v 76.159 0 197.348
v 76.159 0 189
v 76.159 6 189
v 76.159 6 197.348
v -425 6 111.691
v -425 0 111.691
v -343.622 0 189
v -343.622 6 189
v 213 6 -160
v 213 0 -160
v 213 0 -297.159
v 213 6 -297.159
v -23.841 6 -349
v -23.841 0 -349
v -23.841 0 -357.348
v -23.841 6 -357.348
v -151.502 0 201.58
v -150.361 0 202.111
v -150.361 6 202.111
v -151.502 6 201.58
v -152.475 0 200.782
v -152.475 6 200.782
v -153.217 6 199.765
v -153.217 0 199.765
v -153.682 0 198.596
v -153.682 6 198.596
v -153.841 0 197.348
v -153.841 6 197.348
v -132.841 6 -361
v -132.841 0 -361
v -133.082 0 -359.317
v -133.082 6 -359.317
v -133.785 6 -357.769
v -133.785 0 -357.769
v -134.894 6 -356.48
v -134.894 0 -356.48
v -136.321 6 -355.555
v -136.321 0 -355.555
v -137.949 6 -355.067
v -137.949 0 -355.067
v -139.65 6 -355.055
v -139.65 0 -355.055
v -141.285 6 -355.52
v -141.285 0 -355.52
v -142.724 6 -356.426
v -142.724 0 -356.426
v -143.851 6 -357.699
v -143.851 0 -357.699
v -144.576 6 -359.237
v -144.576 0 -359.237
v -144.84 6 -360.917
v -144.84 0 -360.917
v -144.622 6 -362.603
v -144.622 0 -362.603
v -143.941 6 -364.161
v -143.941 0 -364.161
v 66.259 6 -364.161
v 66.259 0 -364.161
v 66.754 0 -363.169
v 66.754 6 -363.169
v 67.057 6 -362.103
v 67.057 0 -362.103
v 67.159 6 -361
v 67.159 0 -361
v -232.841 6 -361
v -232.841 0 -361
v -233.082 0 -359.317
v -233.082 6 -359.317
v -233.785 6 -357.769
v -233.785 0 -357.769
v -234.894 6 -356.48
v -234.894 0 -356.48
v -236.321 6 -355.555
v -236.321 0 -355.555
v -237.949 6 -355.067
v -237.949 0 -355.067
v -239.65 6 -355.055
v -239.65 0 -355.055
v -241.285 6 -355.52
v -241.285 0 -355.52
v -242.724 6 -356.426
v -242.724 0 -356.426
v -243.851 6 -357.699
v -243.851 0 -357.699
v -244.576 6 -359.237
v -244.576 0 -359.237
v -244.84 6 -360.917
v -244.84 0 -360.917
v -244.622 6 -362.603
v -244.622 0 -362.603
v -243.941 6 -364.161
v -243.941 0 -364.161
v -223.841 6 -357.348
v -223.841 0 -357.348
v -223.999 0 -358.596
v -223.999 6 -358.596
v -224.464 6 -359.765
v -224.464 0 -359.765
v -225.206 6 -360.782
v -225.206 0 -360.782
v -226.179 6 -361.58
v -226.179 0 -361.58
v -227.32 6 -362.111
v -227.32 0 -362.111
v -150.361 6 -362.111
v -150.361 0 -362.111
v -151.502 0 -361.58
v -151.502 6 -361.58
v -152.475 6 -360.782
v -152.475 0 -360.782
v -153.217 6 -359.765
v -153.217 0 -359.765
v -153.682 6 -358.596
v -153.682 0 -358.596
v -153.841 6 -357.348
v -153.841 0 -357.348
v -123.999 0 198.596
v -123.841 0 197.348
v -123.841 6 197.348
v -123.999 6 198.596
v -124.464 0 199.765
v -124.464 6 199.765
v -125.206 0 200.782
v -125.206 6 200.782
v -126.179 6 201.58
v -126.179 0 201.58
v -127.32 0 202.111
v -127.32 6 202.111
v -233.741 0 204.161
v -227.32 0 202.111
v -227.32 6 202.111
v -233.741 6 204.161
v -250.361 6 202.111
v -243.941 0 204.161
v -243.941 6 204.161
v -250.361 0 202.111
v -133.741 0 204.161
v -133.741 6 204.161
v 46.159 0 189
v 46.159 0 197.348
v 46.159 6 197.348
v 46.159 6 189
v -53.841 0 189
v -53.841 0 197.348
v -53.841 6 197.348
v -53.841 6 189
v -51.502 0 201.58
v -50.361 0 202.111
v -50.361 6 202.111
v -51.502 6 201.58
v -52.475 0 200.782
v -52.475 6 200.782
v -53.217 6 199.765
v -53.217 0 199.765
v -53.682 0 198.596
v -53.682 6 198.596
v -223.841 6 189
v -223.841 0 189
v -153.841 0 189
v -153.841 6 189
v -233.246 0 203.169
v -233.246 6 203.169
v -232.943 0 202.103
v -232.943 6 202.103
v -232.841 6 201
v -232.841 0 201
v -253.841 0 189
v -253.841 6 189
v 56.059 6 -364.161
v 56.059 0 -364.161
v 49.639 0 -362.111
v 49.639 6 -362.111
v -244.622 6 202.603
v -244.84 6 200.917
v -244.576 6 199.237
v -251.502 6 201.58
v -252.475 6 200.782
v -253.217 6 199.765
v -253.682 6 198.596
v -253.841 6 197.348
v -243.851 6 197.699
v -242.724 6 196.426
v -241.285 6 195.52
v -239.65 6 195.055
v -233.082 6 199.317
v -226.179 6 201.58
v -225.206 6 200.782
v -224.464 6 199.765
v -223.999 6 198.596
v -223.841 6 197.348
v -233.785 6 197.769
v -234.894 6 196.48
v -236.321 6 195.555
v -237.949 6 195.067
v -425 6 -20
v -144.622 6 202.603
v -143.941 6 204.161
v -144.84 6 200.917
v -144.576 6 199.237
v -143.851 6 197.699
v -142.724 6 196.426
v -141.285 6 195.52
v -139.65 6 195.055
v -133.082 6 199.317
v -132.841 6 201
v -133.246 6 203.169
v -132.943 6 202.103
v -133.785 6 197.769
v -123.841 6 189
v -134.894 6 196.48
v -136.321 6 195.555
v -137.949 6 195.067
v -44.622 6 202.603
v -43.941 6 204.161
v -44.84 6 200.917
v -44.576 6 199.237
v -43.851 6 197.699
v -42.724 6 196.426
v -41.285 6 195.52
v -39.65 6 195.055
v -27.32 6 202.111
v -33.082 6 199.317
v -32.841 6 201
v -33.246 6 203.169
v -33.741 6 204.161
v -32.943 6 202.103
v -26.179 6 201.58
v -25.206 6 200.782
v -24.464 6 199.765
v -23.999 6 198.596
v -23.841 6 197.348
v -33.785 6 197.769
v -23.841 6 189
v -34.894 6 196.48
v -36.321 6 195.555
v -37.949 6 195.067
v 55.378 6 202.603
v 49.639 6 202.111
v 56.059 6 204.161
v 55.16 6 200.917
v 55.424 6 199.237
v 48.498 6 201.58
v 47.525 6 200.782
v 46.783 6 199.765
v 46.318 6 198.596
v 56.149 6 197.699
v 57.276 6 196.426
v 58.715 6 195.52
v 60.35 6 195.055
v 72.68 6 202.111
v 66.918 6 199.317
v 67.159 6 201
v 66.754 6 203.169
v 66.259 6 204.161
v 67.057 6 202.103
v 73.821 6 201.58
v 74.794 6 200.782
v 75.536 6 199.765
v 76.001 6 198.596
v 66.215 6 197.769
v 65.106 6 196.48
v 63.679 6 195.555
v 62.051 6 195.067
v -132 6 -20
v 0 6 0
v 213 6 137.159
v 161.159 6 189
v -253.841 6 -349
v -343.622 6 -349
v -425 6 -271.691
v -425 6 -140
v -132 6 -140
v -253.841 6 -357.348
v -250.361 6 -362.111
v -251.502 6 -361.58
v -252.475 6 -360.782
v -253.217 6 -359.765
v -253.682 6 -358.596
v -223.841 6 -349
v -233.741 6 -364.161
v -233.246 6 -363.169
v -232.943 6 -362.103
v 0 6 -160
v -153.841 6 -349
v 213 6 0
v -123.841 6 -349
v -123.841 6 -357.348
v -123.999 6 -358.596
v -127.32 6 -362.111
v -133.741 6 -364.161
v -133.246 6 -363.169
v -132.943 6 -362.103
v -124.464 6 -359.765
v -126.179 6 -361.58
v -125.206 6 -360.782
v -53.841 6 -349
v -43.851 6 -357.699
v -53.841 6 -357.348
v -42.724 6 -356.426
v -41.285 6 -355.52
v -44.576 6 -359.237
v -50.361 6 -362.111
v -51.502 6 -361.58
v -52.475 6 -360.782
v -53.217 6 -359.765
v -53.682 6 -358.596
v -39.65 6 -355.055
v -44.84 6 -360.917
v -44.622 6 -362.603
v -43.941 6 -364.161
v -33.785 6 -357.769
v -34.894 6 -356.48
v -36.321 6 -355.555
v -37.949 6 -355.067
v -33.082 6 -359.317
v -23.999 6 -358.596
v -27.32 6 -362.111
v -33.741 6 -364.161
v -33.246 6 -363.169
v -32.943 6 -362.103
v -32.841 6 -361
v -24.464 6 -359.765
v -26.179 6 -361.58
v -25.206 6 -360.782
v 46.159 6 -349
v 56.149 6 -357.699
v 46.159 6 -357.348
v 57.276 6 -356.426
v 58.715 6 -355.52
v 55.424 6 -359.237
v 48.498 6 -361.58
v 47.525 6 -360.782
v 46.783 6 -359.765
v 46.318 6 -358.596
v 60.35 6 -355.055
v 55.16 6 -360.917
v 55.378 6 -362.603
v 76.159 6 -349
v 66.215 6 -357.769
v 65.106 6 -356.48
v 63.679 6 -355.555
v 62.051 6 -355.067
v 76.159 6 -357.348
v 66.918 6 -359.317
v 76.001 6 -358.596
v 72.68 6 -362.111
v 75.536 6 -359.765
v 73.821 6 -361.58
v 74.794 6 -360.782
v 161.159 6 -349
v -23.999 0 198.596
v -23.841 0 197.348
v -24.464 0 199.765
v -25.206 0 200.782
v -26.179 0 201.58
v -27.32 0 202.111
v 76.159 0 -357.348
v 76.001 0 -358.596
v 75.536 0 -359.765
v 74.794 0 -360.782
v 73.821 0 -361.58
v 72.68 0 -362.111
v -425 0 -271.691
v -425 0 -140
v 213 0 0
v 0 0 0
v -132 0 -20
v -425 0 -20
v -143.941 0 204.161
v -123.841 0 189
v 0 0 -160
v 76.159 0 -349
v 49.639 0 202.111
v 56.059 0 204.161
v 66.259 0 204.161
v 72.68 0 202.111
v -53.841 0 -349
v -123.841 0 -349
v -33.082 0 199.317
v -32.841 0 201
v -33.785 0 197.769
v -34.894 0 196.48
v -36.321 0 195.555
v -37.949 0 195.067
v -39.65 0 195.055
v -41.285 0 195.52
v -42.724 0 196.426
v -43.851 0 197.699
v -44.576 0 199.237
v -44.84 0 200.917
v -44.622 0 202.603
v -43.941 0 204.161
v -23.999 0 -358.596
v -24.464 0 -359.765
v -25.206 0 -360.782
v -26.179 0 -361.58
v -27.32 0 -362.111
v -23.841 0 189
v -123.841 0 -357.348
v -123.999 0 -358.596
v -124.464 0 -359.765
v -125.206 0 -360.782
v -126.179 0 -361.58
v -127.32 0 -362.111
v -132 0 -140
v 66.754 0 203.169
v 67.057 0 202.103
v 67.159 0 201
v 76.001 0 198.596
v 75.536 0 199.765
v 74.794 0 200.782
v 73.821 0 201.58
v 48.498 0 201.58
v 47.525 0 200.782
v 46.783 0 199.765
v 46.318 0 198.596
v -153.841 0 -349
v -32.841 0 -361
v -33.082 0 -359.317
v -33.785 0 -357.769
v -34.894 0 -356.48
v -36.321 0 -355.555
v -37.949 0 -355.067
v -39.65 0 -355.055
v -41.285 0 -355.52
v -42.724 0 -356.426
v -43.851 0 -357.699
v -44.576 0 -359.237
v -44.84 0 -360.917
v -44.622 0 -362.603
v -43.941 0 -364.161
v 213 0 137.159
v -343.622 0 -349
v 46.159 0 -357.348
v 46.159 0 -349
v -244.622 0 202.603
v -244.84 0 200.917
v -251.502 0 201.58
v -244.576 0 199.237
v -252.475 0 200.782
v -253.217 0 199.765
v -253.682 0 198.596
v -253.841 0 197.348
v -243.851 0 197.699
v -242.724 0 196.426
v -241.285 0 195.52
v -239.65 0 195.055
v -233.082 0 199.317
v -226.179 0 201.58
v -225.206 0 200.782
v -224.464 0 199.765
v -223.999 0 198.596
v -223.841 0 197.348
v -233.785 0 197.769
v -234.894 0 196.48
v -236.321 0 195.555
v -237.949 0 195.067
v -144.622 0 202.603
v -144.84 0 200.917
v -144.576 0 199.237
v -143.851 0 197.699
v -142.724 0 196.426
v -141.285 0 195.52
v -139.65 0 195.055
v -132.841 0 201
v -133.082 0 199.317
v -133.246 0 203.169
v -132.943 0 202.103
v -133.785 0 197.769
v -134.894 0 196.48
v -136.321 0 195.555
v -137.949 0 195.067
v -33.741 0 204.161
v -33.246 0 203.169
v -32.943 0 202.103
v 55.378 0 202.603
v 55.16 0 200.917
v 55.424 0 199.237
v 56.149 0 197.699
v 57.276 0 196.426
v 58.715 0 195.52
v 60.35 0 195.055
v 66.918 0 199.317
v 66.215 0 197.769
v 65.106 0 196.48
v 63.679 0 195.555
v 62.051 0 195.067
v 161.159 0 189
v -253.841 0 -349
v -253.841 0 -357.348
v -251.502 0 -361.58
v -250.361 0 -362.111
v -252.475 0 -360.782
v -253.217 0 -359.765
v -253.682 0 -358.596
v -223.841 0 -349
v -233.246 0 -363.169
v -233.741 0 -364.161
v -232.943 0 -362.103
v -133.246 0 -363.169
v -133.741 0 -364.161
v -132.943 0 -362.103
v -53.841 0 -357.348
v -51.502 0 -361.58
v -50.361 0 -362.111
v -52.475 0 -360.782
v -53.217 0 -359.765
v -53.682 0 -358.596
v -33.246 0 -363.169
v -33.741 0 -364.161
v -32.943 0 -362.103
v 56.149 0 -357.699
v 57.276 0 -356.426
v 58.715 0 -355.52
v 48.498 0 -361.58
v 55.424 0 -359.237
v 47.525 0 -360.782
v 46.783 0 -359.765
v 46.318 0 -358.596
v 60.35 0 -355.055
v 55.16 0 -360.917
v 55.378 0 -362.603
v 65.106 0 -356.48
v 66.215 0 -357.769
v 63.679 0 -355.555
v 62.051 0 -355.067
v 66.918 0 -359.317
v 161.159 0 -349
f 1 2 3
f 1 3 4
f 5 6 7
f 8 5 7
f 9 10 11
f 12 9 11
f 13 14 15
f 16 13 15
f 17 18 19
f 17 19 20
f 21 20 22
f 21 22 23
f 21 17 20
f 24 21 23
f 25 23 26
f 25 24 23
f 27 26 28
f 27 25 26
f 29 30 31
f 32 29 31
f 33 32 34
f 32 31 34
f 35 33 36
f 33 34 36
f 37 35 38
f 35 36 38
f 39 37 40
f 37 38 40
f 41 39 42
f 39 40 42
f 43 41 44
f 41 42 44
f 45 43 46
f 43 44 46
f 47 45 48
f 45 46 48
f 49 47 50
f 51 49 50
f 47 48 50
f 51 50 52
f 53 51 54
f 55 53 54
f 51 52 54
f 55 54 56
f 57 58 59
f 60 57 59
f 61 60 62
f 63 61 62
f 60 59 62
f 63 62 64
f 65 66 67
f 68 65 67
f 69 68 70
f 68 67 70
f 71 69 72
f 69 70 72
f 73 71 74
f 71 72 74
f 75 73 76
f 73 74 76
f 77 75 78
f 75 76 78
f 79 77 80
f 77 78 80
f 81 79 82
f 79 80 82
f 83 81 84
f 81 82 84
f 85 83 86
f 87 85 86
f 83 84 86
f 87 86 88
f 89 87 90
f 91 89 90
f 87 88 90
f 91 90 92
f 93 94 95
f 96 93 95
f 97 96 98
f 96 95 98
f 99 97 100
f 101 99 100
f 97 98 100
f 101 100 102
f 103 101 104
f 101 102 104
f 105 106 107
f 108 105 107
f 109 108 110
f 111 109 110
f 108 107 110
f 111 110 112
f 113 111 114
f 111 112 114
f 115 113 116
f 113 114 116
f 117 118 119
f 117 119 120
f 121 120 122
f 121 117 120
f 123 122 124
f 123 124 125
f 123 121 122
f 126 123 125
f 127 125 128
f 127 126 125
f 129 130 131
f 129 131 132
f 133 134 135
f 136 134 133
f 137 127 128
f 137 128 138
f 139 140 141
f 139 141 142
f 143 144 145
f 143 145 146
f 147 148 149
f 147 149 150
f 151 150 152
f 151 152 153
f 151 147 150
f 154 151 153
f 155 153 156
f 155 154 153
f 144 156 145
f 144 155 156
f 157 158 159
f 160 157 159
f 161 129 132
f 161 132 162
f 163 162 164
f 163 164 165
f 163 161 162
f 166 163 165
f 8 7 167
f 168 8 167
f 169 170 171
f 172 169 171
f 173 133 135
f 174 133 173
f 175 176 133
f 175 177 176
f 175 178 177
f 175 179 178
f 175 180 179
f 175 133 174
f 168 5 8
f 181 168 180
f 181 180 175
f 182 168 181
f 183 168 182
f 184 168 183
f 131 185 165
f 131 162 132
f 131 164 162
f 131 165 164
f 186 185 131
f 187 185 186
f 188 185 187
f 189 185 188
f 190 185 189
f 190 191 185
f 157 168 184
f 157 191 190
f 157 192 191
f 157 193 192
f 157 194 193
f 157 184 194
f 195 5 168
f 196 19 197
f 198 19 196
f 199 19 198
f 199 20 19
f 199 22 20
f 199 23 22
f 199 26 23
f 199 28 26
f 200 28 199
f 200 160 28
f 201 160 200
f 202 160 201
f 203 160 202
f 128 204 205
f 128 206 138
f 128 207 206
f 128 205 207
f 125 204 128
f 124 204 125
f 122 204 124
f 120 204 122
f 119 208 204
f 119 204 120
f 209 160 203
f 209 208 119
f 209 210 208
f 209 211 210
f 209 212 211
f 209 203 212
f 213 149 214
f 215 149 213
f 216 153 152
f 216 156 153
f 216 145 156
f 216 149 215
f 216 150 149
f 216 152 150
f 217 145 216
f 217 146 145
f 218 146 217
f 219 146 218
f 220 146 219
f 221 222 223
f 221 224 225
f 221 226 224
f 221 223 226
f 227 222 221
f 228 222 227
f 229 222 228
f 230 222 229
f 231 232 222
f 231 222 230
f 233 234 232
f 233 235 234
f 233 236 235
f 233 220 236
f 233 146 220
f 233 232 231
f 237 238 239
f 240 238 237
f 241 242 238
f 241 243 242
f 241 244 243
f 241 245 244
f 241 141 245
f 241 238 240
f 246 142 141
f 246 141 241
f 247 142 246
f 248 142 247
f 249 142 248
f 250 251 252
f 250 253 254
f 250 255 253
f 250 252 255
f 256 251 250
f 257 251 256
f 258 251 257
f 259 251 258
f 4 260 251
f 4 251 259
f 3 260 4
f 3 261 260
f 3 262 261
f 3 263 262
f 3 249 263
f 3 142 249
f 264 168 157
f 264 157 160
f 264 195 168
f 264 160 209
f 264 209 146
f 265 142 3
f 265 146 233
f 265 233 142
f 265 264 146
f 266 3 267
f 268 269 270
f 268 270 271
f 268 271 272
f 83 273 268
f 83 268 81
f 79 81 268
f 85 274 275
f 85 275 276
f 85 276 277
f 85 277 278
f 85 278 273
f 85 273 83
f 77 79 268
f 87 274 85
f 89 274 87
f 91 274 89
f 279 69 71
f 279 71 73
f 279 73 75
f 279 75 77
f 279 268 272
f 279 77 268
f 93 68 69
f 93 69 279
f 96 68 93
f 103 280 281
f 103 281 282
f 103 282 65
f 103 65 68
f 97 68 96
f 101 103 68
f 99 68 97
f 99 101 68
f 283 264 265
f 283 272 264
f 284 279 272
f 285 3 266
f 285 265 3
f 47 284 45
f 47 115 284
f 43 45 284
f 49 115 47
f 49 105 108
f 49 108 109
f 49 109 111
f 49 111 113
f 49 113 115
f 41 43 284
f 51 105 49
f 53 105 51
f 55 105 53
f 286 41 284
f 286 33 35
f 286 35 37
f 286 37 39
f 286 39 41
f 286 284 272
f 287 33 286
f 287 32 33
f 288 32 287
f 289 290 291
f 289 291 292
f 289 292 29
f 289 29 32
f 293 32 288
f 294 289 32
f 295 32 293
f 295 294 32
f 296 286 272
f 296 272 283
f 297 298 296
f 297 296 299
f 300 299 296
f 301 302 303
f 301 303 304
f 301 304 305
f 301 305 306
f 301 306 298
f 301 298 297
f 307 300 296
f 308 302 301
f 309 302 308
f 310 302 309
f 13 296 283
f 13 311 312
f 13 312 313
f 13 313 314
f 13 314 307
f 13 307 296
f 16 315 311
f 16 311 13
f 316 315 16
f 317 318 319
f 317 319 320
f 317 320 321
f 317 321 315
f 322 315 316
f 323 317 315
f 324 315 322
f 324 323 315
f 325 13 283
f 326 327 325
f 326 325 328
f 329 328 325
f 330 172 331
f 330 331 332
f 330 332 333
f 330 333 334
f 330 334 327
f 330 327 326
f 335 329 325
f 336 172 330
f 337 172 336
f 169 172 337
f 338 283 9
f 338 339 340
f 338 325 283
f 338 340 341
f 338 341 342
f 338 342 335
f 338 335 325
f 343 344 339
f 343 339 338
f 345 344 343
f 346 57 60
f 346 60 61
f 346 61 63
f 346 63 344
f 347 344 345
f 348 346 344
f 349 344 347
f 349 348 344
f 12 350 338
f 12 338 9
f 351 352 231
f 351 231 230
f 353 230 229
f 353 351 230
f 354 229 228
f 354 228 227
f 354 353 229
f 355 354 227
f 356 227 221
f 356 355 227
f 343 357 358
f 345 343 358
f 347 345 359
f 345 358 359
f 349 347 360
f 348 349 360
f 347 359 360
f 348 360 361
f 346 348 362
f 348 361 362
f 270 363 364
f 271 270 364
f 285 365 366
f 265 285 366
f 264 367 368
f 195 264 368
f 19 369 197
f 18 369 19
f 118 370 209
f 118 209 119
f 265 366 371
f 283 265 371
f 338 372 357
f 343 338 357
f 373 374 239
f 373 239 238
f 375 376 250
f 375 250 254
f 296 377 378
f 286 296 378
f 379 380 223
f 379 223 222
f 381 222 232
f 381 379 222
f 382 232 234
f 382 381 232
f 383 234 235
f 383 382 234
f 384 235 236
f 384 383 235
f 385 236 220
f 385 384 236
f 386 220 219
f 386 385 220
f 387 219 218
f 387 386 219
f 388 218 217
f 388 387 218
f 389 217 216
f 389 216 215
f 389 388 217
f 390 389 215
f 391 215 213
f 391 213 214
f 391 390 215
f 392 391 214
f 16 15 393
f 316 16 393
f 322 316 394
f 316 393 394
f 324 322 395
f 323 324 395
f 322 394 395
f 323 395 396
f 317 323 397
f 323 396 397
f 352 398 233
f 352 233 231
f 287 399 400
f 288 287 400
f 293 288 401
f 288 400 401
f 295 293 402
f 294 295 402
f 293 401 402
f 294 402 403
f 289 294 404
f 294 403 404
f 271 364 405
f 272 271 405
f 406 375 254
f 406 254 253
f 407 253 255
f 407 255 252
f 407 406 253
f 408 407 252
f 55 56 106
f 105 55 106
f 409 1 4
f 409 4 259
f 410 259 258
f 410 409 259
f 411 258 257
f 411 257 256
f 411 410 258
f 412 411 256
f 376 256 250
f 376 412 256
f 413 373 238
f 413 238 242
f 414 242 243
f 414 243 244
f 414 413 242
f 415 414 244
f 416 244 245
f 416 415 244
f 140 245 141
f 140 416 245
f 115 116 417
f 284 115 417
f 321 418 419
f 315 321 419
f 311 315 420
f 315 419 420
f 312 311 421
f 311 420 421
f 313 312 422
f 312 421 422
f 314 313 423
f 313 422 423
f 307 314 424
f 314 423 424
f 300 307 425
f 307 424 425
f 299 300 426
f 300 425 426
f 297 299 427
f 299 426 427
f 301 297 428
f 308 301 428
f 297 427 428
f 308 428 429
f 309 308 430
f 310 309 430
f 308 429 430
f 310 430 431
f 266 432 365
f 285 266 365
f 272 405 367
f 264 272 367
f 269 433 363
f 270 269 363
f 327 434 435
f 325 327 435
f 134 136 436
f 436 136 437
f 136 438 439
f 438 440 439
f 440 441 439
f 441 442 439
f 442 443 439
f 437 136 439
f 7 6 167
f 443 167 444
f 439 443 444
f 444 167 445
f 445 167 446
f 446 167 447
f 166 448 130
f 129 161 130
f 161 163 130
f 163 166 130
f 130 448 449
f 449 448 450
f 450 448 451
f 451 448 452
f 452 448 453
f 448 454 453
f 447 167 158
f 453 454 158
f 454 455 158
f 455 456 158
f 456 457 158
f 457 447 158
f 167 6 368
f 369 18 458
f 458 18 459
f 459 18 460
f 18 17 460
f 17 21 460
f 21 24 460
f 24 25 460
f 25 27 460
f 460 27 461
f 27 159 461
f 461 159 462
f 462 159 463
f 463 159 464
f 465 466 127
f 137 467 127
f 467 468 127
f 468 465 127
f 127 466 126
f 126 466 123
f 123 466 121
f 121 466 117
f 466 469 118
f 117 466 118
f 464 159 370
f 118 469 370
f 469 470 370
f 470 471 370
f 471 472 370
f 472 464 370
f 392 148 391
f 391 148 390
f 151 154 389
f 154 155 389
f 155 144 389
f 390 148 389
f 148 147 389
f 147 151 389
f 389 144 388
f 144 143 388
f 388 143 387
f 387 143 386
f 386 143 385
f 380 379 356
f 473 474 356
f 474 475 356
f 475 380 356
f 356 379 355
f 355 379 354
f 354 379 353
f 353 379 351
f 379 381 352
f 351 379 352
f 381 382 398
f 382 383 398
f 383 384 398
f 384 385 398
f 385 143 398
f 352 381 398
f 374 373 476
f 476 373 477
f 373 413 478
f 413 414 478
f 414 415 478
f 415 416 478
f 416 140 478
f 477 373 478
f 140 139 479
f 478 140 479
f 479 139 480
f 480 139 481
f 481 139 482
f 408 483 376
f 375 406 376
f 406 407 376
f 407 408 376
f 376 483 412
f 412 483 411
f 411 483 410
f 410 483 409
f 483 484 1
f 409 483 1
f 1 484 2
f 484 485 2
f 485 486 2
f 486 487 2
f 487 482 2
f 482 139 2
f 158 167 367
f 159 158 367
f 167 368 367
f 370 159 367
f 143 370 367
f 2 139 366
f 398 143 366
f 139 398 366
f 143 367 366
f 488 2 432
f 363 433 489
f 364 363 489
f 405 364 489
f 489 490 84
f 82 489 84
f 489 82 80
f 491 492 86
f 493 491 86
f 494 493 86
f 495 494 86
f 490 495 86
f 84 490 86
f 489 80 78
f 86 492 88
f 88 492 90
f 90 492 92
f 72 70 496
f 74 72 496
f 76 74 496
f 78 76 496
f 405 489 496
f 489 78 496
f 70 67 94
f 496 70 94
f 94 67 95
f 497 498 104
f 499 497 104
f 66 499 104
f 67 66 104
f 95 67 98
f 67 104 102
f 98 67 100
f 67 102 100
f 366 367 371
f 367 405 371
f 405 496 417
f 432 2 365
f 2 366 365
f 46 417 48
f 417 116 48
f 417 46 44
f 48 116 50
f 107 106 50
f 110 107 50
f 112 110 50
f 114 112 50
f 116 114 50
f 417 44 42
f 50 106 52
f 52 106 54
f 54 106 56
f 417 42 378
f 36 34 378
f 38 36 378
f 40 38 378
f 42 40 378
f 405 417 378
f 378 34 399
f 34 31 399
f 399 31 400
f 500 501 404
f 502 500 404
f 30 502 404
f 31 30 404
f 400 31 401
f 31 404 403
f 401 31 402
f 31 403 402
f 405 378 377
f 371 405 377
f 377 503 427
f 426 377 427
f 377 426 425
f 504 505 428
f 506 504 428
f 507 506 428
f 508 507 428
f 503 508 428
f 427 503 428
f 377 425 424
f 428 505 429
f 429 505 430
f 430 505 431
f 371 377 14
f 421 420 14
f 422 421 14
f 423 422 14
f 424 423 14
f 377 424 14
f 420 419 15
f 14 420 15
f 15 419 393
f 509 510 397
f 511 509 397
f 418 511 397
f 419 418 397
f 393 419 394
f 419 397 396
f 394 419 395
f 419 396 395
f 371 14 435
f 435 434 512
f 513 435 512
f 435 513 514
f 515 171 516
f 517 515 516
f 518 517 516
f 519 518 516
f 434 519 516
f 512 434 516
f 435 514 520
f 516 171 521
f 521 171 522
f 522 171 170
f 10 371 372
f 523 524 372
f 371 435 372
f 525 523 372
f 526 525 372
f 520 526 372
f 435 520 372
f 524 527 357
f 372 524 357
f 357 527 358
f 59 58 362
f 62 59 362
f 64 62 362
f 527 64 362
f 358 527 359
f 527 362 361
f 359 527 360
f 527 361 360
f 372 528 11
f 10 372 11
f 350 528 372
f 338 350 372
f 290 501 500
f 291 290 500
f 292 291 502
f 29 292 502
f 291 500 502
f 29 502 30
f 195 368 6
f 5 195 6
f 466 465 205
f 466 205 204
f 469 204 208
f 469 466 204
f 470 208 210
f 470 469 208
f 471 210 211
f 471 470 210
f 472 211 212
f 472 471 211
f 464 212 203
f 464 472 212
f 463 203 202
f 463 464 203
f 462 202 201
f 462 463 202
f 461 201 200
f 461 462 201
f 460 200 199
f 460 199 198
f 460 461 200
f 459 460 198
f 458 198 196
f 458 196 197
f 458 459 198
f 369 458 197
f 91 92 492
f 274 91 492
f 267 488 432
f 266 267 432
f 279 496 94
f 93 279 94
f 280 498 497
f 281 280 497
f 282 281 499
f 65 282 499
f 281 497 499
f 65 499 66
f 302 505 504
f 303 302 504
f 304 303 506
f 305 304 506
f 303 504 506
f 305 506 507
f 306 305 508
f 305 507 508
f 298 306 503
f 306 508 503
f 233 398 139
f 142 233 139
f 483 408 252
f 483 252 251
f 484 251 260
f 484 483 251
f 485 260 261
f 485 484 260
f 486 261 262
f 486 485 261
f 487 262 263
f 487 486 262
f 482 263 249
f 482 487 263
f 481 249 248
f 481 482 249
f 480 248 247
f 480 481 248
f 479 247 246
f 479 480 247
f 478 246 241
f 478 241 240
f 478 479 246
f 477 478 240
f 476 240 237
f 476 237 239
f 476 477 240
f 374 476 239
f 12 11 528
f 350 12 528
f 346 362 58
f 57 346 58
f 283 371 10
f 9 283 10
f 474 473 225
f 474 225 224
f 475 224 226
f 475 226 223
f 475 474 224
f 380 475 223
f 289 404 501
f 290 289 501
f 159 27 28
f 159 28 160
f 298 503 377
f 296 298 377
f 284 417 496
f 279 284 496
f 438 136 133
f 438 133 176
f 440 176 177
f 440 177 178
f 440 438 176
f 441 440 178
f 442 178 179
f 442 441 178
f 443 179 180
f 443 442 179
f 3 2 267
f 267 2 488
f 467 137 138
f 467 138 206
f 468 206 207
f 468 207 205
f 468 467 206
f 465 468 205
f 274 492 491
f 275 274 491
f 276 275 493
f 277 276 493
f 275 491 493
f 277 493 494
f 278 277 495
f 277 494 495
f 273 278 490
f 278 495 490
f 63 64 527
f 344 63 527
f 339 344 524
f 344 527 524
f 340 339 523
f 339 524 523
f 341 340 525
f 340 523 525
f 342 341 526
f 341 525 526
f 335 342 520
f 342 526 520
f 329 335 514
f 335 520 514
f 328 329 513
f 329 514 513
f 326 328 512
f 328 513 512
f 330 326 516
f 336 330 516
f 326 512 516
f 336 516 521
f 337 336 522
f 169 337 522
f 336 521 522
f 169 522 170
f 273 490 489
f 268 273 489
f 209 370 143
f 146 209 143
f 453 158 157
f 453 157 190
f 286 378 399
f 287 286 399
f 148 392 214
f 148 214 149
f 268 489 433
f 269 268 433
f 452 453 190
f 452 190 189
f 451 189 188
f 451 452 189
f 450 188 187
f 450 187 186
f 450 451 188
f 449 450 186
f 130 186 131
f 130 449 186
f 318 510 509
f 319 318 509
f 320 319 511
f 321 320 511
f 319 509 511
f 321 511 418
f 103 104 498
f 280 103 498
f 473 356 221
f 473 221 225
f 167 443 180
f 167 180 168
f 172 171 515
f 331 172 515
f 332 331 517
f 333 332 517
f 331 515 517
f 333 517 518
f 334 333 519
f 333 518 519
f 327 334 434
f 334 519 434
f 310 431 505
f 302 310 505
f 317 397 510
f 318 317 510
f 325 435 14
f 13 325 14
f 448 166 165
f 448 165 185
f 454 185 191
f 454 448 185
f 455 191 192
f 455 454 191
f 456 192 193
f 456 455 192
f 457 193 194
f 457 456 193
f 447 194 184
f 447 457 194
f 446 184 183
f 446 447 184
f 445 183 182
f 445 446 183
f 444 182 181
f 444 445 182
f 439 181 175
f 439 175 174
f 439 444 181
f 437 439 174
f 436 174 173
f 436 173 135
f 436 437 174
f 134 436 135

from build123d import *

# Parameters (mm, degrees)
BOSS_EXTRUDE1_DEPTH  = 6
BOSS_EXTRUDE2_DEPTH  = 6
LPATTERN1_COUNT      = 4
LPATTERN1_PITCH      = 100
MIRROR1_COPY_1_DEPTH = 6
MIRROR1_COPY_2_DEPTH = 6
MIRROR1_COPY_3_DEPTH = 6


with BuildPart() as part:
    # Sketch1 → Boss-Extrude1 (new body)
    with BuildSketch(Plane(origin=(0, 0, 0), x_dir=(1, 0, 0), z_dir=(0, 1, 0))):
        Polygon((0, 160), (213, 160), (213, 297.159379566), (161.159379566, 349), (76.159379566, 349), (46.159379566, 349), (-343.622469374, 349), (-425, 271.691345905), (-425, 140), (-132, 140), (-132, 20), (-425, 20), (-425, -111.691345905), (-343.622469374, -189), (161.159379566, -189), (213, -137.159379566), (213, 0), (0, 0), align=None)
    extrude(amount=BOSS_EXTRUDE1_DEPTH)

    # Sketch1<3> → Boss-Extrude2 (add)
    with BuildSketch(Plane(origin=(0, 0, 0), x_dir=(1, 0, 0), z_dir=(0, 1, 0))):
        with BuildLine():
            Line((46.159379566, 349), (76.159379566, 349))
            Line((76.159379566, 349), (76.159379566, 357.347672364))
            ThreePointArc((76.159379566, 357.347672364), (75.196919236, 360.296955907), (72.680070199, 362.110812085))
            Line((72.680070199, 362.110812085), (66.259379566, 364.160696126))
            ThreePointArc((66.259379566, 364.160696126), (66.929994785, 362.643167673), (67.159379566, 361))
            ThreePointArc((67.159379566, 361), (59.516211894, 355.229384781), (56.059379566, 364.160696126))
            Line((56.059379566, 364.160696126), (49.638688934, 362.110812085))
            ThreePointArc((49.638688934, 362.110812085), (47.121839897, 360.296955907), (46.159379566, 357.347672364))
            Line((46.159379566, 357.347672364), (46.159379566, 349))
        make_face()
    boss_extrude2 = extrude(amount=BOSS_EXTRUDE2_DEPTH)

    # LPattern1: Boss-Extrude2 ×4
    with Locations(*[(-i * LPATTERN1_PITCH, 0, 0) for i in range(1, LPATTERN1_COUNT)]):
        add(boss_extrude2)

    # Mirror1: Boss-Extrude2 across plane
    add(boss_extrude2.mirror(Plane.XY.offset(-80)))

    # Mirror1 copy 1 sketch → Mirror1 copy 1 (add)
    with BuildSketch(Plane(origin=(-100, 0, -160), x_dir=(1, 0, 0), z_dir=(0, 1, 0))):
        with BuildLine():
            Line((46.159379566, -349), (76.159379566, -349))
            Line((76.159379566, -349), (76.159379566, -357.347672364))
            ThreePointArc((76.159379566, -357.347672364), (75.196919236, -360.296955907), (72.680070199, -362.110812085))
            Line((72.680070199, -362.110812085), (66.259379566, -364.160696126))
            ThreePointArc((66.259379566, -364.160696126), (66.929994785, -362.643167673), (67.159379566, -361))
            ThreePointArc((67.159379566, -361), (59.516211894, -355.229384781), (56.059379566, -364.160696126))
            Line((56.059379566, -364.160696126), (49.638688934, -362.110812085))
            ThreePointArc((49.638688934, -362.110812085), (47.121839897, -360.296955907), (46.159379566, -357.347672364))
            Line((46.159379566, -357.347672364), (46.159379566, -349))
        make_face()
    extrude(amount=MIRROR1_COPY_1_DEPTH)

    # Mirror1 copy 2 sketch → Mirror1 copy 2 (add)
    with BuildSketch(Plane(origin=(-200, 0, -160), x_dir=(1, 0, 0), z_dir=(0, 1, 0))):
        with BuildLine():
            Line((46.159379566, -349), (76.159379566, -349))
            Line((76.159379566, -349), (76.159379566, -357.347672364))
            ThreePointArc((76.159379566, -357.347672364), (75.196919236, -360.296955907), (72.680070199, -362.110812085))
            Line((72.680070199, -362.110812085), (66.259379566, -364.160696126))
            ThreePointArc((66.259379566, -364.160696126), (66.929994785, -362.643167673), (67.159379566, -361))
            ThreePointArc((67.159379566, -361), (59.516211894, -355.229384781), (56.059379566, -364.160696126))
            Line((56.059379566, -364.160696126), (49.638688934, -362.110812085))
            ThreePointArc((49.638688934, -362.110812085), (47.121839897, -360.296955907), (46.159379566, -357.347672364))
            Line((46.159379566, -357.347672364), (46.159379566, -349))
        make_face()
    extrude(amount=MIRROR1_COPY_2_DEPTH)

    # Mirror1 copy 3 sketch → Mirror1 copy 3 (add)
    with BuildSketch(Plane(origin=(-300, 0, -160), x_dir=(1, 0, 0), z_dir=(0, 1, 0))):
        with BuildLine():
            Line((46.159379566, -349), (76.159379566, -349))
            Line((76.159379566, -349), (76.159379566, -357.347672364))
            ThreePointArc((76.159379566, -357.347672364), (75.196919236, -360.296955907), (72.680070199, -362.110812085))
            Line((72.680070199, -362.110812085), (66.259379566, -364.160696126))
            ThreePointArc((66.259379566, -364.160696126), (66.929994785, -362.643167673), (67.159379566, -361))
            ThreePointArc((67.159379566, -361), (59.516211894, -355.229384781), (56.059379566, -364.160696126))
            Line((56.059379566, -364.160696126), (49.638688934, -362.110812085))
            ThreePointArc((49.638688934, -362.110812085), (47.121839897, -360.296955907), (46.159379566, -357.347672364))
            Line((46.159379566, -357.347672364), (46.159379566, -349))
        make_face()
    extrude(amount=MIRROR1_COPY_3_DEPTH)


solid = part.part
